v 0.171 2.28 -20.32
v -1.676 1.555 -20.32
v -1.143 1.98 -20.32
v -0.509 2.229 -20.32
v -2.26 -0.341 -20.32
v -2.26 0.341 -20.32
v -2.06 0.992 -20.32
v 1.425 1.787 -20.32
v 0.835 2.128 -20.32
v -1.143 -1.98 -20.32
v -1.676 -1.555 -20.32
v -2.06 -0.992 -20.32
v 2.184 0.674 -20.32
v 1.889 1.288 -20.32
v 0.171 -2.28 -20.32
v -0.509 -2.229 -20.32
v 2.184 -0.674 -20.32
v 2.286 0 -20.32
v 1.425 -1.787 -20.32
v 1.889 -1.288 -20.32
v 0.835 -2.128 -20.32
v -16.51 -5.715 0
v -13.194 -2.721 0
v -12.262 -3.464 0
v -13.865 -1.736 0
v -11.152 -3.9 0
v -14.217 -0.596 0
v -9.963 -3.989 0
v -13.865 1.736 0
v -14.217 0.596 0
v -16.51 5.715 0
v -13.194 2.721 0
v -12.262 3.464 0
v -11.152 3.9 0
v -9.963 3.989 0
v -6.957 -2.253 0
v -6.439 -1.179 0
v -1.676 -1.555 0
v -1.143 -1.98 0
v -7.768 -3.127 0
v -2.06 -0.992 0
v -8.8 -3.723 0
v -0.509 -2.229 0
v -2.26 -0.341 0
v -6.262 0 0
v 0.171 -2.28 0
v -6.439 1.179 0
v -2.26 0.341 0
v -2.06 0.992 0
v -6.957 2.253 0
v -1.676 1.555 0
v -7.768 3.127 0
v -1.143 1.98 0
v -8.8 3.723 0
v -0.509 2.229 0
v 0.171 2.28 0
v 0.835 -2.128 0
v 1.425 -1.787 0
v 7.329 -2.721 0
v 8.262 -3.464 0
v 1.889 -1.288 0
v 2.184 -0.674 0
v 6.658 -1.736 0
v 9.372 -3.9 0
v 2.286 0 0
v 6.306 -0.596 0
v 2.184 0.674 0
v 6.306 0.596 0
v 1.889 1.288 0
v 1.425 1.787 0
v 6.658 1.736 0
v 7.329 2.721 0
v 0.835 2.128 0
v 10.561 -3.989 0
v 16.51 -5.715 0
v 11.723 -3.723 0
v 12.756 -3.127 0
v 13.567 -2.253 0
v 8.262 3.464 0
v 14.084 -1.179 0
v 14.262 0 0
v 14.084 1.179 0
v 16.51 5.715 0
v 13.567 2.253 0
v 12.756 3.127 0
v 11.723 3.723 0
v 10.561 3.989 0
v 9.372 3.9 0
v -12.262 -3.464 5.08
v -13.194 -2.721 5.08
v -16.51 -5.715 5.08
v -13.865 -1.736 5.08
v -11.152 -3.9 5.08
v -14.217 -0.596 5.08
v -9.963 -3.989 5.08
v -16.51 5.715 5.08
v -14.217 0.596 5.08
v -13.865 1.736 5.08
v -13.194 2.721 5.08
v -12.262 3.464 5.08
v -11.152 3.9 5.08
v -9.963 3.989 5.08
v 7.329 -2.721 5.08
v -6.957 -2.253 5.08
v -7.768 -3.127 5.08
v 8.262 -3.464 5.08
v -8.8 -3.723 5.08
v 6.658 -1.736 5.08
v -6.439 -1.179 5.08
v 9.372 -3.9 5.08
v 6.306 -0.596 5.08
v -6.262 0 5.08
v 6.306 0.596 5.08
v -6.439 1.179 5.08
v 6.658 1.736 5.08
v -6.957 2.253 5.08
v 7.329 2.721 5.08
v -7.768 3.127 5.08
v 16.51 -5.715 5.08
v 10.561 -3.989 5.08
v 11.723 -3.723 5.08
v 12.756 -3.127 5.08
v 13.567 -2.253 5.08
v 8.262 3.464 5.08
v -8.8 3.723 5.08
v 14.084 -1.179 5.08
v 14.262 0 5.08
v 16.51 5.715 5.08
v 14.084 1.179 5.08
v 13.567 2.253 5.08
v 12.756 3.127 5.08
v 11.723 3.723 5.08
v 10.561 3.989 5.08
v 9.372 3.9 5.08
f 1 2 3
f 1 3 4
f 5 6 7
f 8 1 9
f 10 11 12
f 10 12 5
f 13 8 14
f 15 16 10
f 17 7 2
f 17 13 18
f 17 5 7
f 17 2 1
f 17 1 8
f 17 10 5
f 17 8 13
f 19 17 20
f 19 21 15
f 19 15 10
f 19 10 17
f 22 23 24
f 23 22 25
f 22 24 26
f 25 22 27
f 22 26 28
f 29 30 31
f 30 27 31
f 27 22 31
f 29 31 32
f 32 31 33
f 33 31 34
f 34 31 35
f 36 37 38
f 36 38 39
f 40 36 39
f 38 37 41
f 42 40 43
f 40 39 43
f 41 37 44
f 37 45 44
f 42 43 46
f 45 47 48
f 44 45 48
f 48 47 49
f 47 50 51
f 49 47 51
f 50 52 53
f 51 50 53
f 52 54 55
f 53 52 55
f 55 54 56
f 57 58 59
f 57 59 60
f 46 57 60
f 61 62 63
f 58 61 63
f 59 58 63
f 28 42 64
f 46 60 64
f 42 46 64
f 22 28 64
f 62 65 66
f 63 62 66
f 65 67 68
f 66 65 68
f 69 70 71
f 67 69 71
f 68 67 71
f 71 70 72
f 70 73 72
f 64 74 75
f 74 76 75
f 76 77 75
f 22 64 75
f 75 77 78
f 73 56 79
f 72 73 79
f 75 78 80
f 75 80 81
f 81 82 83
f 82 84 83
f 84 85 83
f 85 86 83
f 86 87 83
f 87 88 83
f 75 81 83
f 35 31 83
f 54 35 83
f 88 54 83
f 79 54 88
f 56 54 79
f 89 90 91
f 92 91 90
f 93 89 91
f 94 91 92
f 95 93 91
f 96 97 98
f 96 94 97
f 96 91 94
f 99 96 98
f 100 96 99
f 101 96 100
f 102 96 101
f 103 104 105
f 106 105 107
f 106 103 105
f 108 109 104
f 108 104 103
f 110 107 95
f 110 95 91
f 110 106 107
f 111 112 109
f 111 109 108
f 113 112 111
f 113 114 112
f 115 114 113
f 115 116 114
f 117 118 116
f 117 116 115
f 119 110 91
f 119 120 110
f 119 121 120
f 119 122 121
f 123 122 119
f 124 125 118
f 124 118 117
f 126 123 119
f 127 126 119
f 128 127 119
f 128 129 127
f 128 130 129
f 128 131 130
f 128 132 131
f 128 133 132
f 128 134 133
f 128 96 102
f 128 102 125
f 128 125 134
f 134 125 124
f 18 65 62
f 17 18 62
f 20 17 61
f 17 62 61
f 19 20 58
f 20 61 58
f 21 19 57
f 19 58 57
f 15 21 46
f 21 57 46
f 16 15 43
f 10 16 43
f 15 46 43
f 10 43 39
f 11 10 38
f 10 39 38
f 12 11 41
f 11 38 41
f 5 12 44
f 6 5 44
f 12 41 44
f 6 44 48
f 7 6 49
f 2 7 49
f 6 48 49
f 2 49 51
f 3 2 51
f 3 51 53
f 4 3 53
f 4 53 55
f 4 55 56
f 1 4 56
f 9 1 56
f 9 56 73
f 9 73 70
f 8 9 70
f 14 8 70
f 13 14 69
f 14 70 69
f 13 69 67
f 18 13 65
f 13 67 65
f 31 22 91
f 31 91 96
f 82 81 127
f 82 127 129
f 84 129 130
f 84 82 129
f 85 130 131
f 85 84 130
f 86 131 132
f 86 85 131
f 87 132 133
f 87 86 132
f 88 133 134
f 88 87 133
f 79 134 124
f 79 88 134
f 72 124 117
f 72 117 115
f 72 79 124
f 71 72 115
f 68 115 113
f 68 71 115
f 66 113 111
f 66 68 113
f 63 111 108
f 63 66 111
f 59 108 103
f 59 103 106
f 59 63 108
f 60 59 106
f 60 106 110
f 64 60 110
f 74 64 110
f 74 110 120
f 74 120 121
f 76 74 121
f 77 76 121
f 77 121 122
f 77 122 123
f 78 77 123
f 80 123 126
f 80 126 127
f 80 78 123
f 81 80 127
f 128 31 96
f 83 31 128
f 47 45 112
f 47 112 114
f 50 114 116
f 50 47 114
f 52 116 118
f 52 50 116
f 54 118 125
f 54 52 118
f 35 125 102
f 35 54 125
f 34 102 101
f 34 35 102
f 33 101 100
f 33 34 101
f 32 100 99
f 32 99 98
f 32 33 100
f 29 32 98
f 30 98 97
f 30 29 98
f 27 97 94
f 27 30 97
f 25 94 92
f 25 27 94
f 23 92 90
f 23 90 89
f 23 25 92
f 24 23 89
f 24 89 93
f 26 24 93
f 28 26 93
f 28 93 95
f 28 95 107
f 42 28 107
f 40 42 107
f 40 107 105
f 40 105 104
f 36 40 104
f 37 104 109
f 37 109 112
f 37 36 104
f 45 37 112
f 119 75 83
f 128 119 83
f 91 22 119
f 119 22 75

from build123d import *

# Parameters (mm, degrees)
F0_W     = 33.02
F0_H     = 11.43
F0_R     = 4
F1_DEPTH = 5.08
F2_R     = 2.286
F3_DEPTH = 20.32


with BuildPart() as f1:
    # F0 (on Top) → F1 (new body)
    with BuildSketch(Plane.XY):
        Rectangle(F0_W, F0_H)
        with Locations((-10.2616, 0)):
            Circle(F0_R, mode=Mode.SUBTRACT)
        with Locations((10.2616, 0)):
            Circle(F0_R, mode=Mode.SUBTRACT)
    extrude(amount=F1_DEPTH)

    # F2 (on face) → F3 (join)
    with BuildSketch(Plane(origin=(0, 0, 0), x_dir=(1, 0, 0), z_dir=(0, 0, -1))):
        Circle(F2_R)
    extrude(amount=F3_DEPTH)


solid = f1.part
